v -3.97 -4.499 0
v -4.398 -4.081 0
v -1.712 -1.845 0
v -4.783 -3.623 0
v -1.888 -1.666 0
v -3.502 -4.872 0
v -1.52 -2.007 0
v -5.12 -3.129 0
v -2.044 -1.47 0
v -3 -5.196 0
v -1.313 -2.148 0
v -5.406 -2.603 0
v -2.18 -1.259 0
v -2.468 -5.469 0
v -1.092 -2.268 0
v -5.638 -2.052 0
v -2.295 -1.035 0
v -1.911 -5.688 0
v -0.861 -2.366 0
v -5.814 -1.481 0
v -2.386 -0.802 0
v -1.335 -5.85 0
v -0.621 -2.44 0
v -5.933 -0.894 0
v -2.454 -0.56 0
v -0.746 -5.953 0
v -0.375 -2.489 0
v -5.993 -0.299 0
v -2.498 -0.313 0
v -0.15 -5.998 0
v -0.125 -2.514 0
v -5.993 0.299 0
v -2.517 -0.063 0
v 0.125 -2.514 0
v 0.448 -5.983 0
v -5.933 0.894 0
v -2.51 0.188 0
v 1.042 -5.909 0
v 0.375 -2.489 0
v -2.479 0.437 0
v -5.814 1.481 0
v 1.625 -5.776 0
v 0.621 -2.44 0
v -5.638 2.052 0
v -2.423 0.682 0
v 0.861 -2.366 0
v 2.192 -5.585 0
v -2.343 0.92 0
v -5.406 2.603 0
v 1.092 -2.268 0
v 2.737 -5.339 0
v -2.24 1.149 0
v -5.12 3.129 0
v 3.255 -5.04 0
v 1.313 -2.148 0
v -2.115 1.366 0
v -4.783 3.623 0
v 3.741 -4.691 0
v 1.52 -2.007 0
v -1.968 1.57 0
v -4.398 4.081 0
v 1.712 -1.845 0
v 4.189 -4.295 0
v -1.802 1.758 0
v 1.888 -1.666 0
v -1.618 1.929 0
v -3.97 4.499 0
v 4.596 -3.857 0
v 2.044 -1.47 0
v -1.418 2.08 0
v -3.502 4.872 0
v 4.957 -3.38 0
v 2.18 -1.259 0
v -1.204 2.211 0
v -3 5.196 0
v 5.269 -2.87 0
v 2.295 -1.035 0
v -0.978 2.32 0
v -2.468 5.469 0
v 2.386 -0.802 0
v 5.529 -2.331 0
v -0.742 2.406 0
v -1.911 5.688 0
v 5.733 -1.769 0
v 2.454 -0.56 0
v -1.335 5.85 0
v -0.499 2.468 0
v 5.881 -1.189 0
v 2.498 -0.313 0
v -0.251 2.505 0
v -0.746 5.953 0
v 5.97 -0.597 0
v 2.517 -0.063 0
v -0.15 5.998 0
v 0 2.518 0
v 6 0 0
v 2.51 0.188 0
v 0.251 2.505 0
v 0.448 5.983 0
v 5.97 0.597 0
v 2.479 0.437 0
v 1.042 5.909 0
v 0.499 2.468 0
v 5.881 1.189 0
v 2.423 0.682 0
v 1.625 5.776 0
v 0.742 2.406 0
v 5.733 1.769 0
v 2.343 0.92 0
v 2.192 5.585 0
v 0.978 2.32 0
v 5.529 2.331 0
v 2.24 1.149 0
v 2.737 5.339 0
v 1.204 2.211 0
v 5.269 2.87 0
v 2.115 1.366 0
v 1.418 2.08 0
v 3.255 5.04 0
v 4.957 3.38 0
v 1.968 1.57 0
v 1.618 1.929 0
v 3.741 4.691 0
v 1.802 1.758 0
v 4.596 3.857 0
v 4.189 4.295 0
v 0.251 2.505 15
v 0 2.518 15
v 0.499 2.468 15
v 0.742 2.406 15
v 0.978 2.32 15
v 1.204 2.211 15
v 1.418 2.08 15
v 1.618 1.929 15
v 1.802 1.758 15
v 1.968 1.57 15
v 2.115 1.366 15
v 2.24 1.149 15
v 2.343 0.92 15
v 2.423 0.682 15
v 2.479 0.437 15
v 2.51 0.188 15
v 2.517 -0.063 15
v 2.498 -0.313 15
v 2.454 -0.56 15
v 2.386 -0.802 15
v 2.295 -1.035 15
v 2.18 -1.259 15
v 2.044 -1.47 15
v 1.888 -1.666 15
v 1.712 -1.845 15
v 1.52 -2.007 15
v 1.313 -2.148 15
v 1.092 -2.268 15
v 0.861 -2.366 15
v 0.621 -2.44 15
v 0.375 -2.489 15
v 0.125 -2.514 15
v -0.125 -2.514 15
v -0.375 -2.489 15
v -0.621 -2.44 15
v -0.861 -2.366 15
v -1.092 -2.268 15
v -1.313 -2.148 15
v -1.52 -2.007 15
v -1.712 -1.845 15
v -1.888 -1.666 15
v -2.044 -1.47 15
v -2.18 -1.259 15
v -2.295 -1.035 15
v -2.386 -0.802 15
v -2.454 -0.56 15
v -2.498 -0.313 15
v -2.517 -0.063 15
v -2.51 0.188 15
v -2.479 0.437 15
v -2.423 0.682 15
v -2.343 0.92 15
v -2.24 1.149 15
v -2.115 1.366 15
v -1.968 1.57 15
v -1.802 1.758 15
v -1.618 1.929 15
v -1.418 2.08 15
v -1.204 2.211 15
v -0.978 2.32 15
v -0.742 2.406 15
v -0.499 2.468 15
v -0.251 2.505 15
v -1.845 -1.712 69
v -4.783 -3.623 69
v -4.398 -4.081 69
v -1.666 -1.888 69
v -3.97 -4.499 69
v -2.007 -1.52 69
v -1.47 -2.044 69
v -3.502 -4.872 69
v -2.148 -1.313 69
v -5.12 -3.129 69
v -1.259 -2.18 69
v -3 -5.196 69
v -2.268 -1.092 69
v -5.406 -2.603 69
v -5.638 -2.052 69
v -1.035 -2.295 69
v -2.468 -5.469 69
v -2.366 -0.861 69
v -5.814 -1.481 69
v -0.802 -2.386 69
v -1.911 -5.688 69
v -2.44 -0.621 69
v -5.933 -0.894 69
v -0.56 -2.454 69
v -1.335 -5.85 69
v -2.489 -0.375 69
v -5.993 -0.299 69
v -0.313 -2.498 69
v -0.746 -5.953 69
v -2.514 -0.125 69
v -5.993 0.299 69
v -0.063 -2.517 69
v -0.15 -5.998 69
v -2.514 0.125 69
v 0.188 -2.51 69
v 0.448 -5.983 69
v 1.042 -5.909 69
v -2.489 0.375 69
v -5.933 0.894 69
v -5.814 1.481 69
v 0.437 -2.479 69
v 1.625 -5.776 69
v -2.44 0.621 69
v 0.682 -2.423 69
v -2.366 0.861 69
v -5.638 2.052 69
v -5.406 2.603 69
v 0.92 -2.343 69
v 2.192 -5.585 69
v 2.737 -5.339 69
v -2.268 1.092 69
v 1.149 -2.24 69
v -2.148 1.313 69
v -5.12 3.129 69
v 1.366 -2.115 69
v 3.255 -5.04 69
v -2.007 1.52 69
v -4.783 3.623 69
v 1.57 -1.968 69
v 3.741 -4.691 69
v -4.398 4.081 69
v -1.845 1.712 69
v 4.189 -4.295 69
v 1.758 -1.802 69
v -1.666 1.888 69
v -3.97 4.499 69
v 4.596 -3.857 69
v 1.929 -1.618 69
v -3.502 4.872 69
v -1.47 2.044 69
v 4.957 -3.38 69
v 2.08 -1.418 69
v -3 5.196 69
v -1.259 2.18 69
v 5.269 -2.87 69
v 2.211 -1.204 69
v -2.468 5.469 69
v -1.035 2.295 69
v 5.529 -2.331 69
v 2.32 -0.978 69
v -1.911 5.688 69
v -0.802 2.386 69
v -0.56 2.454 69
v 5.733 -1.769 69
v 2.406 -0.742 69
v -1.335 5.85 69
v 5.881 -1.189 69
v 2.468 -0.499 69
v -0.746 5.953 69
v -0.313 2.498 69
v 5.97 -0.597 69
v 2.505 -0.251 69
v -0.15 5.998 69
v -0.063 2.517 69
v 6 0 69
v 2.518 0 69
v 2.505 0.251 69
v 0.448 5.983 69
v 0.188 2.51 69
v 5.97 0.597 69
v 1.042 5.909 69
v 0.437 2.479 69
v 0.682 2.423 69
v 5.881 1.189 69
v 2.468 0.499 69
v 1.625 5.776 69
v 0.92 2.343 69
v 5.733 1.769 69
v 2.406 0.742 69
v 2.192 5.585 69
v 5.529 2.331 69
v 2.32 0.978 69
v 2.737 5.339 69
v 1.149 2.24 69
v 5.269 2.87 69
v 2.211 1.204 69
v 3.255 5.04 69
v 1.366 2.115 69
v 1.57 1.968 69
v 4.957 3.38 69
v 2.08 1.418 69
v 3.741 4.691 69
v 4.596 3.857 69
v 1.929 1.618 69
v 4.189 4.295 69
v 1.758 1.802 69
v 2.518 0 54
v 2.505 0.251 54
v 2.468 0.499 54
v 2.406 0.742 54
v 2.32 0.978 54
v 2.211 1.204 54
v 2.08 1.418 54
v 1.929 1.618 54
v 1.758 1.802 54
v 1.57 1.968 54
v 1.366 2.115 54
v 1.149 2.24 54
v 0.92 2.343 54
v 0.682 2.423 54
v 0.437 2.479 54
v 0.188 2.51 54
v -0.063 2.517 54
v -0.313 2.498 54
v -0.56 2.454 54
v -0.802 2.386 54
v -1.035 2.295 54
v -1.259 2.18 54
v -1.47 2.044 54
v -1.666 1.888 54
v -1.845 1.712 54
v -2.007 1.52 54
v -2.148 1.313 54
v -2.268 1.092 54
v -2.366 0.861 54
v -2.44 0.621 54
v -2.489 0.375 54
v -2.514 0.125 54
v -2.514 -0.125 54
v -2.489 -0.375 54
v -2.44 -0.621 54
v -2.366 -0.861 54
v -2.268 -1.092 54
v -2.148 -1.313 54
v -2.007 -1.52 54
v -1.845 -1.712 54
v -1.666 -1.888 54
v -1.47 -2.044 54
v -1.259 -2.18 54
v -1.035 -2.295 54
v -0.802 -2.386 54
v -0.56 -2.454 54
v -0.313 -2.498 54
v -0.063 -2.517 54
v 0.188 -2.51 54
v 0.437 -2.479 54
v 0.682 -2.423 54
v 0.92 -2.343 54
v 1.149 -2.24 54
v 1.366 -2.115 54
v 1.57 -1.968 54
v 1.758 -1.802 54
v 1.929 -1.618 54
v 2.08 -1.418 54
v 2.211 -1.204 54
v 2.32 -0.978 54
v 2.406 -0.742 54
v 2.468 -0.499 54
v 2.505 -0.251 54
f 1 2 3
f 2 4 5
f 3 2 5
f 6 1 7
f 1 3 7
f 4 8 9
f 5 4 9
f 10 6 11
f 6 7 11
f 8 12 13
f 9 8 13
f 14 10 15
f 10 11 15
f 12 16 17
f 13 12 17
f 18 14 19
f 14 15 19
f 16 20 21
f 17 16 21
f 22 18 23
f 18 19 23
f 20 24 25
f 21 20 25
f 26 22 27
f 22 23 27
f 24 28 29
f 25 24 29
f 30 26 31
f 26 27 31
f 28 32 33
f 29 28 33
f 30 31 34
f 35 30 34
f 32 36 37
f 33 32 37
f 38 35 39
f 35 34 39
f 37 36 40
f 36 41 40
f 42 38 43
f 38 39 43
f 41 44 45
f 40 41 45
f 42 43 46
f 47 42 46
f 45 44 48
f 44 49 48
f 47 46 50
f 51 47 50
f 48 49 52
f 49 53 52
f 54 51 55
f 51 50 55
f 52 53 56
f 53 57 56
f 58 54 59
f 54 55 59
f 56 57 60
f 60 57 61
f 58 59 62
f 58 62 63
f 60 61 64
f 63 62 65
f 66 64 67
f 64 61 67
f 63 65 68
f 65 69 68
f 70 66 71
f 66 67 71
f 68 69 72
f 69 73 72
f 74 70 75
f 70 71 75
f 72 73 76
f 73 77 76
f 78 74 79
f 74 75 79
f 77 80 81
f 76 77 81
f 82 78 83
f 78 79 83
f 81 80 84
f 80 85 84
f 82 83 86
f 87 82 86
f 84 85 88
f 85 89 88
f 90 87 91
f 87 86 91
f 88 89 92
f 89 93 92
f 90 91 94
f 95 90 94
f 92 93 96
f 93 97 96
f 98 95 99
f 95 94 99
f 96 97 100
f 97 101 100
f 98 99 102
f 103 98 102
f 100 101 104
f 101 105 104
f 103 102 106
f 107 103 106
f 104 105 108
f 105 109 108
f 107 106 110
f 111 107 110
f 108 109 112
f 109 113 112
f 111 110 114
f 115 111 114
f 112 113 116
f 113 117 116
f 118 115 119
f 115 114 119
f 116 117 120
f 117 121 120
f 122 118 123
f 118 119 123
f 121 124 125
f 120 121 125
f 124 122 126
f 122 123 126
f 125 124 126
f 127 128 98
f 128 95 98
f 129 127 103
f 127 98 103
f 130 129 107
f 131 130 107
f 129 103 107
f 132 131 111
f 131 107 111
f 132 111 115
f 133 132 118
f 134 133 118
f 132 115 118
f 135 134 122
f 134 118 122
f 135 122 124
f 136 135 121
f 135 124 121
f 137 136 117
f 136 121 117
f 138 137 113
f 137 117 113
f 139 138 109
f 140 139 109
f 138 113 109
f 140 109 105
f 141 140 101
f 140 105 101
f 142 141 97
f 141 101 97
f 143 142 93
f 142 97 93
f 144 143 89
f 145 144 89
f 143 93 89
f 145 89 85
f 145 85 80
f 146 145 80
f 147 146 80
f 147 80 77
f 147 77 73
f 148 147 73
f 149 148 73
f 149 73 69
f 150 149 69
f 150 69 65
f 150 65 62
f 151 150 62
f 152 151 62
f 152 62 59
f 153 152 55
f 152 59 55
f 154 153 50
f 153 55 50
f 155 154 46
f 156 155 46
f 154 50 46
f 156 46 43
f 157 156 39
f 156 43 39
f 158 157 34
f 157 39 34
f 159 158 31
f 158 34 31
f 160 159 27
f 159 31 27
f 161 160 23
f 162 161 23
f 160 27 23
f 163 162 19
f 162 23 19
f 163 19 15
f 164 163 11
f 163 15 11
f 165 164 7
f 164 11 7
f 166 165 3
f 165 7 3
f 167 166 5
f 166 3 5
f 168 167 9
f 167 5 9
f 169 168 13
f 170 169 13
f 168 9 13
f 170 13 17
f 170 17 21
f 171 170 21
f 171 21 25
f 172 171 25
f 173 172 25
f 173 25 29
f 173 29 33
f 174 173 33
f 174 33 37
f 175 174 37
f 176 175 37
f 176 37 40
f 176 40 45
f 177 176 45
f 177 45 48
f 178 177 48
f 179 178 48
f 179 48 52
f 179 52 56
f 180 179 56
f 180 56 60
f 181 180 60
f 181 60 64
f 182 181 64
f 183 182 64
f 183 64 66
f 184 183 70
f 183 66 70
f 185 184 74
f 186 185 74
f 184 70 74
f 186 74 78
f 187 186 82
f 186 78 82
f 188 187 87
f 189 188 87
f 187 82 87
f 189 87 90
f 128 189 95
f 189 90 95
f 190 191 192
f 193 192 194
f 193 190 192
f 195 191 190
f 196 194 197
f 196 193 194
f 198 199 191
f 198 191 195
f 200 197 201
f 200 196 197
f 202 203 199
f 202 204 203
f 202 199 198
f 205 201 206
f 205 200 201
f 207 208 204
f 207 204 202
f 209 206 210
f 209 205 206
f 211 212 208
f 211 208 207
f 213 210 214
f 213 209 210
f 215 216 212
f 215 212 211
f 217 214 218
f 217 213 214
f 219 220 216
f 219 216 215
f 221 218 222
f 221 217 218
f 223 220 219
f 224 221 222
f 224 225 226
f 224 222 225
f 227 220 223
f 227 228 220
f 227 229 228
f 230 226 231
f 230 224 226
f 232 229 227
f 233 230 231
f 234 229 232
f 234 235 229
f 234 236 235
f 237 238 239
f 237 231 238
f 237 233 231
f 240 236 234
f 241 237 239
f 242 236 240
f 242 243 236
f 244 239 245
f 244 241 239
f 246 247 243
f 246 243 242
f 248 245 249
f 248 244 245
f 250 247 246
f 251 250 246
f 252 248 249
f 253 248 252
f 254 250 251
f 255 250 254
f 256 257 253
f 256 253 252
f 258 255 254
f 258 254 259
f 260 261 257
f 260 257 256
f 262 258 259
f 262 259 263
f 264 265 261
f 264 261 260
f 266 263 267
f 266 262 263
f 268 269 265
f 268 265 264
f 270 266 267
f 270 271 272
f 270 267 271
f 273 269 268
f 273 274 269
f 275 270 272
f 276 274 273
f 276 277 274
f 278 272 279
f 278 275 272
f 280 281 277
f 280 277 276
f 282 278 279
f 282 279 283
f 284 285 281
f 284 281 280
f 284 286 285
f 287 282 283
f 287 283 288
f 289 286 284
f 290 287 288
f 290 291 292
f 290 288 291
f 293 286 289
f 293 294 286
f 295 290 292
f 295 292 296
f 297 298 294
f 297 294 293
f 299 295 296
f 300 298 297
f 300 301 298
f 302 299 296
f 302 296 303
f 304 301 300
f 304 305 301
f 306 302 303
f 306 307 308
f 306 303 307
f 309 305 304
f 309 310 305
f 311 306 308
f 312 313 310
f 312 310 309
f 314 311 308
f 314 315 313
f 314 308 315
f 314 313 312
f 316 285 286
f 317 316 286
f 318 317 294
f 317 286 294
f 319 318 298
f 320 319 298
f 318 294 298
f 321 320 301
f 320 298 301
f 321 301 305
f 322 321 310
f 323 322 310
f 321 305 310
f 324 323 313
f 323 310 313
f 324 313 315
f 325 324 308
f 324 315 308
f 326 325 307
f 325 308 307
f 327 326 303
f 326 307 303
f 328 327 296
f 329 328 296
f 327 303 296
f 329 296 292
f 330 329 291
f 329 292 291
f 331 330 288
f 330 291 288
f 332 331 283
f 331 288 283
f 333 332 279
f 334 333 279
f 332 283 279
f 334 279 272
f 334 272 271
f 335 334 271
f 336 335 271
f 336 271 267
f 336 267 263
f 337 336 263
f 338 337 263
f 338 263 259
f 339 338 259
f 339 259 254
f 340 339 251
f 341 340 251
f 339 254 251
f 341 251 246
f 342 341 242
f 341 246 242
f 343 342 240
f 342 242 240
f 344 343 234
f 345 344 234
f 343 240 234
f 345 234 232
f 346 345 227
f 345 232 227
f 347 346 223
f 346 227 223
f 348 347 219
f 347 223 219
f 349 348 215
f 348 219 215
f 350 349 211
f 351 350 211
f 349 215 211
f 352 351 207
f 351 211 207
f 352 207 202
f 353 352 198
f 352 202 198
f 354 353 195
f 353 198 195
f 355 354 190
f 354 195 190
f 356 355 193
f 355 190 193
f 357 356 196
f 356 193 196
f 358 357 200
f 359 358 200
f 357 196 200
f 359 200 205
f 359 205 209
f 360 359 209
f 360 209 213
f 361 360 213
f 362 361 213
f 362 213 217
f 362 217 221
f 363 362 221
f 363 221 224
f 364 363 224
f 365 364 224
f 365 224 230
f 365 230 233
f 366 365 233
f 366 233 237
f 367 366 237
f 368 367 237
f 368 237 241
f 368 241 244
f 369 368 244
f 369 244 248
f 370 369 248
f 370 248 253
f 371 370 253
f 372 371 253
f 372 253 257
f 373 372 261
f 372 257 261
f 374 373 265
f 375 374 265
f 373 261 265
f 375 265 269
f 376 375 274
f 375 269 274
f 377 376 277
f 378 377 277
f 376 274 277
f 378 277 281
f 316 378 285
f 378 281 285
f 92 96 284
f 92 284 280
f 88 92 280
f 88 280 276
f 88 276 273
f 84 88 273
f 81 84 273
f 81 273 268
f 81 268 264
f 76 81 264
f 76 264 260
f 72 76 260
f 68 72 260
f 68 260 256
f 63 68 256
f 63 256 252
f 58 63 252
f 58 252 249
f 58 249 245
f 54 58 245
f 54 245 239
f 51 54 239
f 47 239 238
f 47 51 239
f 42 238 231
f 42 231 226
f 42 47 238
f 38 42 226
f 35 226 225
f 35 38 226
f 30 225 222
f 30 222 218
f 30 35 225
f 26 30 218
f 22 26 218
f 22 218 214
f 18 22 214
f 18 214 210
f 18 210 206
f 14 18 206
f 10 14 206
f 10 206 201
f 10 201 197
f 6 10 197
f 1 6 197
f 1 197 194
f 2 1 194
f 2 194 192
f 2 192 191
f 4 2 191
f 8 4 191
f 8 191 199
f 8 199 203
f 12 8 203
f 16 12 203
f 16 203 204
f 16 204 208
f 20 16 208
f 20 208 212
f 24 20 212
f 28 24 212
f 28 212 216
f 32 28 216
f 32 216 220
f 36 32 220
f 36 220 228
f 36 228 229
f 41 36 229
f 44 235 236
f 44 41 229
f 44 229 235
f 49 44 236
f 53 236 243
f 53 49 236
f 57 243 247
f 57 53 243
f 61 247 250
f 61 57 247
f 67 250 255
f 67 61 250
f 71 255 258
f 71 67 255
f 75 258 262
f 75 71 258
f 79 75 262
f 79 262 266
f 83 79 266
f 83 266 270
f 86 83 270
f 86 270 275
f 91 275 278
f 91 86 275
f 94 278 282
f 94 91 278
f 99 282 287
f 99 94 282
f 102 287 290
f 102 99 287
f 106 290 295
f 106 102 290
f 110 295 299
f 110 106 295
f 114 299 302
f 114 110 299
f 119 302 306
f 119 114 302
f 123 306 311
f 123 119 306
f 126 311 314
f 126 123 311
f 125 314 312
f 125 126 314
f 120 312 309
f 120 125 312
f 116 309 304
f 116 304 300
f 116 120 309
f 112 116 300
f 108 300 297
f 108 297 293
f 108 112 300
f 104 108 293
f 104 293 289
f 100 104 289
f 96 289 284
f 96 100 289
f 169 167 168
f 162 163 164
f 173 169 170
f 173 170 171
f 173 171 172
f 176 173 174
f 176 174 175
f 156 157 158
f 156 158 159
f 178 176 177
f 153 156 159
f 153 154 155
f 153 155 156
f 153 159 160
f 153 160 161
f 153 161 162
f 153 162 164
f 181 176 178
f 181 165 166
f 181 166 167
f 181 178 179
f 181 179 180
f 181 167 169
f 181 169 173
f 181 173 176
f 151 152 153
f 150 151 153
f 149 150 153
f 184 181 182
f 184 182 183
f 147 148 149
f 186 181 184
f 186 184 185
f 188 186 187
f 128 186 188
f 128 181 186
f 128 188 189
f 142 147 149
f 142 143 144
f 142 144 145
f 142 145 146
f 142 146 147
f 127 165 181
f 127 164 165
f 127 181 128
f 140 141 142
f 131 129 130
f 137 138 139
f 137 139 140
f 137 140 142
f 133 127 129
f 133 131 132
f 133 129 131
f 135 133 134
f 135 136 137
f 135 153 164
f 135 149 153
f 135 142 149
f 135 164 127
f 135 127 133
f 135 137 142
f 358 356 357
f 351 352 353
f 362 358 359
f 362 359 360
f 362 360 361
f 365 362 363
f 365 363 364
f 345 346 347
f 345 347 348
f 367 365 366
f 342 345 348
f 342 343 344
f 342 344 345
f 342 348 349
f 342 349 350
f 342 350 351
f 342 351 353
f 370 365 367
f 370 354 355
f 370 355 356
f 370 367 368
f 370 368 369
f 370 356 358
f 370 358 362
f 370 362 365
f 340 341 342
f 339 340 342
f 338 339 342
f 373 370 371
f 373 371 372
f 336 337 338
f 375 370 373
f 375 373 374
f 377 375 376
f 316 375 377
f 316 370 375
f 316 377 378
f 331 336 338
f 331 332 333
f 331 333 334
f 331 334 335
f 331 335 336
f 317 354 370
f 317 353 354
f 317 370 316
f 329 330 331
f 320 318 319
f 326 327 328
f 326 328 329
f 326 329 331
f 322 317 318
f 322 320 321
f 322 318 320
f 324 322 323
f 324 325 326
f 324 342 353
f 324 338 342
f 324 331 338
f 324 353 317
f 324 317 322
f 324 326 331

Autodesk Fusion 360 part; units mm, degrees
sketch "スケッチ1" plane through (0, 0, 0) normal (0, 0, 1) x (1, 0, 0)
  circle A0 centre (0, 0) radius 6
  dimension "d1" = 12
extrude "押し出し1" add sketch "スケッチ1" along normal blind 69
cylinder "円柱プリミティブ1" cut diameter 6 height -15 placed x (1, 0, 0) y (0, 1, 0) z (0, 0, 1) at (0, 0, 69)
thread "ねじ1" "ISO Metric profile 6.0 M6x1 6H" major diameter 6.147 minor diameter 5.035 pitch 1 angle 60 resizes the face on face at (2.9851, -0.2987, 59)
cylinder "円柱プリミティブ2" cut diameter 6 height -15 placed x (0, 1, 0) y (1, 0, 0) z (0, 0, -1) at (0, 0, 0)
thread "ねじ2" "ISO Metric profile 6.0 M6x1 6H" major diameter 6.147 minor diameter 5.035 pitch 1 angle 60 resizes the face on face at (-0.2987, 2.9851, 10)
